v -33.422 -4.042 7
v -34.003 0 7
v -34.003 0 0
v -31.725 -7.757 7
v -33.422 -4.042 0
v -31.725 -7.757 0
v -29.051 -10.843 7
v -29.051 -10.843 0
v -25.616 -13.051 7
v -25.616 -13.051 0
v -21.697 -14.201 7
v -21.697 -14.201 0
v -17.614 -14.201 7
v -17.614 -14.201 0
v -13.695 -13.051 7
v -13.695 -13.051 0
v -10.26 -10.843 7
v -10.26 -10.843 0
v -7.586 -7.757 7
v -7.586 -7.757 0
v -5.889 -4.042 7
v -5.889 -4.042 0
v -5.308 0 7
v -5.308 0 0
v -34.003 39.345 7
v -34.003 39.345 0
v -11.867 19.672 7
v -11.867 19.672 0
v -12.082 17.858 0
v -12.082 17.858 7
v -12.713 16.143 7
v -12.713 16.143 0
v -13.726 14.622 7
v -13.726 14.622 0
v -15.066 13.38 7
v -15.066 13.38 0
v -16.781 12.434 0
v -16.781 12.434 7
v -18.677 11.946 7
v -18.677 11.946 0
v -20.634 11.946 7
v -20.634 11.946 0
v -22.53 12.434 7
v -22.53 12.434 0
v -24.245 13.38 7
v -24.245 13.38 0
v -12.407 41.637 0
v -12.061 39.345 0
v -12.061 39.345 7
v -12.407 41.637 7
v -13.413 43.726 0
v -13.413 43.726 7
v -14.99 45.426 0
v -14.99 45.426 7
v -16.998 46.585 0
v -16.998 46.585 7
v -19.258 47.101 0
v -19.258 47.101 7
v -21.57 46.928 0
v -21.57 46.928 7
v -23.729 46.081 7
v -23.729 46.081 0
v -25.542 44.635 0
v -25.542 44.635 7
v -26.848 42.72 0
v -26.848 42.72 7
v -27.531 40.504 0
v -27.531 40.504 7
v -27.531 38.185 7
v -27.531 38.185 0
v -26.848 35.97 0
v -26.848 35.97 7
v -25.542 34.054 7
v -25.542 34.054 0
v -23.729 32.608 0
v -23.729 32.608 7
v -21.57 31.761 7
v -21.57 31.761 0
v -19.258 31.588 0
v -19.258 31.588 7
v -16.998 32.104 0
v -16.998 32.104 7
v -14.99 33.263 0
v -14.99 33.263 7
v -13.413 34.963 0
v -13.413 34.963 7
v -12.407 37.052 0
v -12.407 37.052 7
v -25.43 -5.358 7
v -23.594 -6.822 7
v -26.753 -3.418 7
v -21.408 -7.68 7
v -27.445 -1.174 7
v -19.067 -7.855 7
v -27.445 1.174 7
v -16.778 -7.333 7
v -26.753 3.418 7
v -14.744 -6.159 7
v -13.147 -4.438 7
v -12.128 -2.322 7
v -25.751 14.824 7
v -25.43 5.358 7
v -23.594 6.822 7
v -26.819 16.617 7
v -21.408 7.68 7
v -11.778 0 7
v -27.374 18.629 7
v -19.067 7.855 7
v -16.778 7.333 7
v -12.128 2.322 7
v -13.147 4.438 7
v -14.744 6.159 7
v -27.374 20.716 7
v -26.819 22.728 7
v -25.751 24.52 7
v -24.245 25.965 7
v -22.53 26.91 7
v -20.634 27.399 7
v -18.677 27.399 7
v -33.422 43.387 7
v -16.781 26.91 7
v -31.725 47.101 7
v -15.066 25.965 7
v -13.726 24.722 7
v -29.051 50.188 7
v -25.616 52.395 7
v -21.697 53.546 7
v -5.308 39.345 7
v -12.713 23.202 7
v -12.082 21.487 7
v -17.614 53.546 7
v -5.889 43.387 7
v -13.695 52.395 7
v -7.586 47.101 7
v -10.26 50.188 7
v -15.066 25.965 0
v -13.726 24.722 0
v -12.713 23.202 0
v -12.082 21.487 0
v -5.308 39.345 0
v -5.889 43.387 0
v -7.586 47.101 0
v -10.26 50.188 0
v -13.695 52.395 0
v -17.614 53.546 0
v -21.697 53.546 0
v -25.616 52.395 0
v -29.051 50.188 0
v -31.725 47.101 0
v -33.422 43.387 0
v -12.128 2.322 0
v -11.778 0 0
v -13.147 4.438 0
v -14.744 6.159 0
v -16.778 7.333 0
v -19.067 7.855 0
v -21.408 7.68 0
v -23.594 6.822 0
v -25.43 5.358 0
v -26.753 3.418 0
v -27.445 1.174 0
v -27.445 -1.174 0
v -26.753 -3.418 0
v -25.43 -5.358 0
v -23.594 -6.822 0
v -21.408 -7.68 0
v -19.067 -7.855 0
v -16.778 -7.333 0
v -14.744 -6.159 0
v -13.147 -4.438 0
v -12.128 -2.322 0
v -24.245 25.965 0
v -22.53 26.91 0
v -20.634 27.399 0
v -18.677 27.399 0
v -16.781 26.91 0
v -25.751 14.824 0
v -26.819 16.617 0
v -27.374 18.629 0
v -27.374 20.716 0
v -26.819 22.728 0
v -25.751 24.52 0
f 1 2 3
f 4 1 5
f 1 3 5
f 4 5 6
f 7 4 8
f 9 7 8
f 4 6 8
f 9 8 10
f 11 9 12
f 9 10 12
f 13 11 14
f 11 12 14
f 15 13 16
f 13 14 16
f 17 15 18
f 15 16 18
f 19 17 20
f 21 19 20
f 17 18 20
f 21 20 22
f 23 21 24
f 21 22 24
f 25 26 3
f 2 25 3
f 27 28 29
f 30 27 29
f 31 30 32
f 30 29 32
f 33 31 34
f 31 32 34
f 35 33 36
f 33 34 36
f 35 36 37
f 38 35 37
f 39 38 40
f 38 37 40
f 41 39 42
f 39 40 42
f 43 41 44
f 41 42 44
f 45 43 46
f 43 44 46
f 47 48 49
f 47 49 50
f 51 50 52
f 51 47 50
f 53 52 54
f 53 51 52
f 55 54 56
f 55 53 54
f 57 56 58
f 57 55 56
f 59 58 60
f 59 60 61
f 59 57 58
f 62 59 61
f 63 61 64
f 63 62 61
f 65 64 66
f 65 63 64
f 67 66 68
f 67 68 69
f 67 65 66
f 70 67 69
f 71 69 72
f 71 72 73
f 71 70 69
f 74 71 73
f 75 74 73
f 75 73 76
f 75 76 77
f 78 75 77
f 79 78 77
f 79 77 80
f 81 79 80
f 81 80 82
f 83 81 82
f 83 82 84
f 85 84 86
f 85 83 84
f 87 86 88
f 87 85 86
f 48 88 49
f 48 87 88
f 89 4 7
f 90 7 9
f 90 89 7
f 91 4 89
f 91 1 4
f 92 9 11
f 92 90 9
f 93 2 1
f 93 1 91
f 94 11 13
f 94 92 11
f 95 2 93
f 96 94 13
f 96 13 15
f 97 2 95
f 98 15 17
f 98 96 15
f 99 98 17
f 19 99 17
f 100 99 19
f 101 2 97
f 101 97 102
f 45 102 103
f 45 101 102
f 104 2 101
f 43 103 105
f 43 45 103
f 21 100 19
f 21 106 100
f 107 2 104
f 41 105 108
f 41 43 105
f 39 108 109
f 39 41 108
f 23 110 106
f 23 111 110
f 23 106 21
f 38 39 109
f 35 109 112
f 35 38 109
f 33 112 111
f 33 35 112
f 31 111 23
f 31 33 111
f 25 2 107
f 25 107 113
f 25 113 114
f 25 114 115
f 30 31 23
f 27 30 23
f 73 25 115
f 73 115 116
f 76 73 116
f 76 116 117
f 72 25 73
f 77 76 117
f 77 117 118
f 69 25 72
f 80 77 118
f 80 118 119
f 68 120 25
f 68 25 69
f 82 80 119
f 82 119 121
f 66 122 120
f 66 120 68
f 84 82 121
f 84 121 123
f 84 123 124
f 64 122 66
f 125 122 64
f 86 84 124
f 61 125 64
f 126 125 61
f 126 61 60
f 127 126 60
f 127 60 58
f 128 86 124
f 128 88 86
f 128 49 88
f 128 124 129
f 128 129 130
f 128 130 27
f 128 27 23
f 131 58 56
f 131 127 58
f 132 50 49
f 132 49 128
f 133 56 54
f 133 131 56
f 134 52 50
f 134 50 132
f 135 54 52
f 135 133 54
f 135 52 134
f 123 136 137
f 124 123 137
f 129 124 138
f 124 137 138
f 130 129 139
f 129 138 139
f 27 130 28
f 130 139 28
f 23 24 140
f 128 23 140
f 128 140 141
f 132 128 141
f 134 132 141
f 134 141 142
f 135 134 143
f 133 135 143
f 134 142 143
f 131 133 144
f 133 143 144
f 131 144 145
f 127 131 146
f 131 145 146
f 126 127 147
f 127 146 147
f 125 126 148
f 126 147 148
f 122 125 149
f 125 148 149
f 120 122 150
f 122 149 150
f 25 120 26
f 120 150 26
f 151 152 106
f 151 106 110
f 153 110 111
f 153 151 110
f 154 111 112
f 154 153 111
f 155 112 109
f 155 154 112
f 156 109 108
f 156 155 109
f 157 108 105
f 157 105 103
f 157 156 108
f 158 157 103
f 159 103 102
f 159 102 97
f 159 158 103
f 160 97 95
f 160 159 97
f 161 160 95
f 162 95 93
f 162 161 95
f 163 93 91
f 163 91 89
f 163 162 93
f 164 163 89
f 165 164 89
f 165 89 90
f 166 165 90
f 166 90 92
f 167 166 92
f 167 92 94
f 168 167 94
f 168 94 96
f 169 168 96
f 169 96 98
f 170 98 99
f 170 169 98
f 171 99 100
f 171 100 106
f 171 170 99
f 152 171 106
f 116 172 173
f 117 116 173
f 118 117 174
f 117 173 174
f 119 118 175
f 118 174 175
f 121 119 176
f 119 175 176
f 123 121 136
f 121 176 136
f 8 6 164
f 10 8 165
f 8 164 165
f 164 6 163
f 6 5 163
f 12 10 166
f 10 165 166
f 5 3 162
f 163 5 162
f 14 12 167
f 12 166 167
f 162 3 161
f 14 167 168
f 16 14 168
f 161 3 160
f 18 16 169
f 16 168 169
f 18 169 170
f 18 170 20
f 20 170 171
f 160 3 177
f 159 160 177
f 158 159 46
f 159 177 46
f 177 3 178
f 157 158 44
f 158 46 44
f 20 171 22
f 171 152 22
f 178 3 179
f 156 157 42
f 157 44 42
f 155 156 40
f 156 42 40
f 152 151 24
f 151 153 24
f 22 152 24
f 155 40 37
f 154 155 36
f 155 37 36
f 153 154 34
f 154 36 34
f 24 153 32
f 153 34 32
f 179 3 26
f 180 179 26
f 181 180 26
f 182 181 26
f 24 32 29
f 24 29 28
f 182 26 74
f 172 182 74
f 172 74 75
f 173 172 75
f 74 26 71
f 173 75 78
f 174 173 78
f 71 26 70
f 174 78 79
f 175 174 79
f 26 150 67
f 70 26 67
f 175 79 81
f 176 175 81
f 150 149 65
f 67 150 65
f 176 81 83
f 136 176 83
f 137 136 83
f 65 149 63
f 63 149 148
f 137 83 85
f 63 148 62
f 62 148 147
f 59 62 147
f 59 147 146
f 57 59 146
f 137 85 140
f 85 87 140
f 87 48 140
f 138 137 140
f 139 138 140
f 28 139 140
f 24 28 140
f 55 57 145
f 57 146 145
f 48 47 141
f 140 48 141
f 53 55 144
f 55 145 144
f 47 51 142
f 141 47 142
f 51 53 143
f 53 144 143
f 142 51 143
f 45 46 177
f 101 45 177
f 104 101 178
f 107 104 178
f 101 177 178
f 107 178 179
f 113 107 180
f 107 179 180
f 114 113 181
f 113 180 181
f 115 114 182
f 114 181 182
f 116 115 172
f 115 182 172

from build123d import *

# Parameters (mm, degrees)
F0_R     = 7.778434
F0_R_2   = 7.877406
F1_DEPTH = 7


with BuildPart() as f1:
    # F0 (on Top) → F1 (new body)
    with BuildSketch(Plane.XY):
        with BuildLine():
            Line((-24.244773, 25.964786), (-34.002946, 39.3446))
            Line((-34.002946, 39.3446), (-34.002946, 0))
            Line((-34.002946, 0), (-24.244773, 13.379814))
            ThreePointArc((-24.244773, 13.379814), (-27.443761, 19.6723), (-24.244773, 25.964786))
        make_face()
        with BuildLine():
            Line((-5.30812, 0), (-5.30812, 39.3446))
            Line((-5.30812, 39.3446), (-15.066294, 25.964786))
            ThreePointArc((-15.066294, 25.964786), (-12.712963, 23.20178), (-11.867305, 19.6723))
            ThreePointArc((-11.867305, 19.6723), (-12.712963, 16.14282), (-15.066294, 13.379814))
            Line((-15.066294, 13.379814), (-5.30812, 0))
        make_face()
        with BuildLine():
            Line((-15.066294, 25.964786), (-5.30812, 39.3446))
            ThreePointArc((-5.30812, 39.3446), (-19.655533, 53.692013), (-34.002946, 39.3446))
            Line((-34.002946, 39.3446), (-24.244773, 25.964786))
            ThreePointArc((-24.244773, 25.964786), (-19.655533, 27.460528), (-15.066294, 25.964786))
        make_face()
        with Locations((-19.839631, 39.3446)):
            Circle(F0_R, mode=Mode.SUBTRACT)
        with BuildLine():
            ThreePointArc((-34.002946, 0), (-19.655533, -14.347413), (-5.30812, 0))
            Line((-5.30812, 0), (-15.066294, 13.379814))
            ThreePointArc((-15.066294, 13.379814), (-19.655533, 11.884072), (-24.244773, 13.379814))
            Line((-24.244773, 13.379814), (-34.002946, 0))
        make_face()
        with Locations((-19.655533, 0)):
            Circle(F0_R_2, mode=Mode.SUBTRACT)
    extrude(amount=F1_DEPTH)


solid = f1.part
